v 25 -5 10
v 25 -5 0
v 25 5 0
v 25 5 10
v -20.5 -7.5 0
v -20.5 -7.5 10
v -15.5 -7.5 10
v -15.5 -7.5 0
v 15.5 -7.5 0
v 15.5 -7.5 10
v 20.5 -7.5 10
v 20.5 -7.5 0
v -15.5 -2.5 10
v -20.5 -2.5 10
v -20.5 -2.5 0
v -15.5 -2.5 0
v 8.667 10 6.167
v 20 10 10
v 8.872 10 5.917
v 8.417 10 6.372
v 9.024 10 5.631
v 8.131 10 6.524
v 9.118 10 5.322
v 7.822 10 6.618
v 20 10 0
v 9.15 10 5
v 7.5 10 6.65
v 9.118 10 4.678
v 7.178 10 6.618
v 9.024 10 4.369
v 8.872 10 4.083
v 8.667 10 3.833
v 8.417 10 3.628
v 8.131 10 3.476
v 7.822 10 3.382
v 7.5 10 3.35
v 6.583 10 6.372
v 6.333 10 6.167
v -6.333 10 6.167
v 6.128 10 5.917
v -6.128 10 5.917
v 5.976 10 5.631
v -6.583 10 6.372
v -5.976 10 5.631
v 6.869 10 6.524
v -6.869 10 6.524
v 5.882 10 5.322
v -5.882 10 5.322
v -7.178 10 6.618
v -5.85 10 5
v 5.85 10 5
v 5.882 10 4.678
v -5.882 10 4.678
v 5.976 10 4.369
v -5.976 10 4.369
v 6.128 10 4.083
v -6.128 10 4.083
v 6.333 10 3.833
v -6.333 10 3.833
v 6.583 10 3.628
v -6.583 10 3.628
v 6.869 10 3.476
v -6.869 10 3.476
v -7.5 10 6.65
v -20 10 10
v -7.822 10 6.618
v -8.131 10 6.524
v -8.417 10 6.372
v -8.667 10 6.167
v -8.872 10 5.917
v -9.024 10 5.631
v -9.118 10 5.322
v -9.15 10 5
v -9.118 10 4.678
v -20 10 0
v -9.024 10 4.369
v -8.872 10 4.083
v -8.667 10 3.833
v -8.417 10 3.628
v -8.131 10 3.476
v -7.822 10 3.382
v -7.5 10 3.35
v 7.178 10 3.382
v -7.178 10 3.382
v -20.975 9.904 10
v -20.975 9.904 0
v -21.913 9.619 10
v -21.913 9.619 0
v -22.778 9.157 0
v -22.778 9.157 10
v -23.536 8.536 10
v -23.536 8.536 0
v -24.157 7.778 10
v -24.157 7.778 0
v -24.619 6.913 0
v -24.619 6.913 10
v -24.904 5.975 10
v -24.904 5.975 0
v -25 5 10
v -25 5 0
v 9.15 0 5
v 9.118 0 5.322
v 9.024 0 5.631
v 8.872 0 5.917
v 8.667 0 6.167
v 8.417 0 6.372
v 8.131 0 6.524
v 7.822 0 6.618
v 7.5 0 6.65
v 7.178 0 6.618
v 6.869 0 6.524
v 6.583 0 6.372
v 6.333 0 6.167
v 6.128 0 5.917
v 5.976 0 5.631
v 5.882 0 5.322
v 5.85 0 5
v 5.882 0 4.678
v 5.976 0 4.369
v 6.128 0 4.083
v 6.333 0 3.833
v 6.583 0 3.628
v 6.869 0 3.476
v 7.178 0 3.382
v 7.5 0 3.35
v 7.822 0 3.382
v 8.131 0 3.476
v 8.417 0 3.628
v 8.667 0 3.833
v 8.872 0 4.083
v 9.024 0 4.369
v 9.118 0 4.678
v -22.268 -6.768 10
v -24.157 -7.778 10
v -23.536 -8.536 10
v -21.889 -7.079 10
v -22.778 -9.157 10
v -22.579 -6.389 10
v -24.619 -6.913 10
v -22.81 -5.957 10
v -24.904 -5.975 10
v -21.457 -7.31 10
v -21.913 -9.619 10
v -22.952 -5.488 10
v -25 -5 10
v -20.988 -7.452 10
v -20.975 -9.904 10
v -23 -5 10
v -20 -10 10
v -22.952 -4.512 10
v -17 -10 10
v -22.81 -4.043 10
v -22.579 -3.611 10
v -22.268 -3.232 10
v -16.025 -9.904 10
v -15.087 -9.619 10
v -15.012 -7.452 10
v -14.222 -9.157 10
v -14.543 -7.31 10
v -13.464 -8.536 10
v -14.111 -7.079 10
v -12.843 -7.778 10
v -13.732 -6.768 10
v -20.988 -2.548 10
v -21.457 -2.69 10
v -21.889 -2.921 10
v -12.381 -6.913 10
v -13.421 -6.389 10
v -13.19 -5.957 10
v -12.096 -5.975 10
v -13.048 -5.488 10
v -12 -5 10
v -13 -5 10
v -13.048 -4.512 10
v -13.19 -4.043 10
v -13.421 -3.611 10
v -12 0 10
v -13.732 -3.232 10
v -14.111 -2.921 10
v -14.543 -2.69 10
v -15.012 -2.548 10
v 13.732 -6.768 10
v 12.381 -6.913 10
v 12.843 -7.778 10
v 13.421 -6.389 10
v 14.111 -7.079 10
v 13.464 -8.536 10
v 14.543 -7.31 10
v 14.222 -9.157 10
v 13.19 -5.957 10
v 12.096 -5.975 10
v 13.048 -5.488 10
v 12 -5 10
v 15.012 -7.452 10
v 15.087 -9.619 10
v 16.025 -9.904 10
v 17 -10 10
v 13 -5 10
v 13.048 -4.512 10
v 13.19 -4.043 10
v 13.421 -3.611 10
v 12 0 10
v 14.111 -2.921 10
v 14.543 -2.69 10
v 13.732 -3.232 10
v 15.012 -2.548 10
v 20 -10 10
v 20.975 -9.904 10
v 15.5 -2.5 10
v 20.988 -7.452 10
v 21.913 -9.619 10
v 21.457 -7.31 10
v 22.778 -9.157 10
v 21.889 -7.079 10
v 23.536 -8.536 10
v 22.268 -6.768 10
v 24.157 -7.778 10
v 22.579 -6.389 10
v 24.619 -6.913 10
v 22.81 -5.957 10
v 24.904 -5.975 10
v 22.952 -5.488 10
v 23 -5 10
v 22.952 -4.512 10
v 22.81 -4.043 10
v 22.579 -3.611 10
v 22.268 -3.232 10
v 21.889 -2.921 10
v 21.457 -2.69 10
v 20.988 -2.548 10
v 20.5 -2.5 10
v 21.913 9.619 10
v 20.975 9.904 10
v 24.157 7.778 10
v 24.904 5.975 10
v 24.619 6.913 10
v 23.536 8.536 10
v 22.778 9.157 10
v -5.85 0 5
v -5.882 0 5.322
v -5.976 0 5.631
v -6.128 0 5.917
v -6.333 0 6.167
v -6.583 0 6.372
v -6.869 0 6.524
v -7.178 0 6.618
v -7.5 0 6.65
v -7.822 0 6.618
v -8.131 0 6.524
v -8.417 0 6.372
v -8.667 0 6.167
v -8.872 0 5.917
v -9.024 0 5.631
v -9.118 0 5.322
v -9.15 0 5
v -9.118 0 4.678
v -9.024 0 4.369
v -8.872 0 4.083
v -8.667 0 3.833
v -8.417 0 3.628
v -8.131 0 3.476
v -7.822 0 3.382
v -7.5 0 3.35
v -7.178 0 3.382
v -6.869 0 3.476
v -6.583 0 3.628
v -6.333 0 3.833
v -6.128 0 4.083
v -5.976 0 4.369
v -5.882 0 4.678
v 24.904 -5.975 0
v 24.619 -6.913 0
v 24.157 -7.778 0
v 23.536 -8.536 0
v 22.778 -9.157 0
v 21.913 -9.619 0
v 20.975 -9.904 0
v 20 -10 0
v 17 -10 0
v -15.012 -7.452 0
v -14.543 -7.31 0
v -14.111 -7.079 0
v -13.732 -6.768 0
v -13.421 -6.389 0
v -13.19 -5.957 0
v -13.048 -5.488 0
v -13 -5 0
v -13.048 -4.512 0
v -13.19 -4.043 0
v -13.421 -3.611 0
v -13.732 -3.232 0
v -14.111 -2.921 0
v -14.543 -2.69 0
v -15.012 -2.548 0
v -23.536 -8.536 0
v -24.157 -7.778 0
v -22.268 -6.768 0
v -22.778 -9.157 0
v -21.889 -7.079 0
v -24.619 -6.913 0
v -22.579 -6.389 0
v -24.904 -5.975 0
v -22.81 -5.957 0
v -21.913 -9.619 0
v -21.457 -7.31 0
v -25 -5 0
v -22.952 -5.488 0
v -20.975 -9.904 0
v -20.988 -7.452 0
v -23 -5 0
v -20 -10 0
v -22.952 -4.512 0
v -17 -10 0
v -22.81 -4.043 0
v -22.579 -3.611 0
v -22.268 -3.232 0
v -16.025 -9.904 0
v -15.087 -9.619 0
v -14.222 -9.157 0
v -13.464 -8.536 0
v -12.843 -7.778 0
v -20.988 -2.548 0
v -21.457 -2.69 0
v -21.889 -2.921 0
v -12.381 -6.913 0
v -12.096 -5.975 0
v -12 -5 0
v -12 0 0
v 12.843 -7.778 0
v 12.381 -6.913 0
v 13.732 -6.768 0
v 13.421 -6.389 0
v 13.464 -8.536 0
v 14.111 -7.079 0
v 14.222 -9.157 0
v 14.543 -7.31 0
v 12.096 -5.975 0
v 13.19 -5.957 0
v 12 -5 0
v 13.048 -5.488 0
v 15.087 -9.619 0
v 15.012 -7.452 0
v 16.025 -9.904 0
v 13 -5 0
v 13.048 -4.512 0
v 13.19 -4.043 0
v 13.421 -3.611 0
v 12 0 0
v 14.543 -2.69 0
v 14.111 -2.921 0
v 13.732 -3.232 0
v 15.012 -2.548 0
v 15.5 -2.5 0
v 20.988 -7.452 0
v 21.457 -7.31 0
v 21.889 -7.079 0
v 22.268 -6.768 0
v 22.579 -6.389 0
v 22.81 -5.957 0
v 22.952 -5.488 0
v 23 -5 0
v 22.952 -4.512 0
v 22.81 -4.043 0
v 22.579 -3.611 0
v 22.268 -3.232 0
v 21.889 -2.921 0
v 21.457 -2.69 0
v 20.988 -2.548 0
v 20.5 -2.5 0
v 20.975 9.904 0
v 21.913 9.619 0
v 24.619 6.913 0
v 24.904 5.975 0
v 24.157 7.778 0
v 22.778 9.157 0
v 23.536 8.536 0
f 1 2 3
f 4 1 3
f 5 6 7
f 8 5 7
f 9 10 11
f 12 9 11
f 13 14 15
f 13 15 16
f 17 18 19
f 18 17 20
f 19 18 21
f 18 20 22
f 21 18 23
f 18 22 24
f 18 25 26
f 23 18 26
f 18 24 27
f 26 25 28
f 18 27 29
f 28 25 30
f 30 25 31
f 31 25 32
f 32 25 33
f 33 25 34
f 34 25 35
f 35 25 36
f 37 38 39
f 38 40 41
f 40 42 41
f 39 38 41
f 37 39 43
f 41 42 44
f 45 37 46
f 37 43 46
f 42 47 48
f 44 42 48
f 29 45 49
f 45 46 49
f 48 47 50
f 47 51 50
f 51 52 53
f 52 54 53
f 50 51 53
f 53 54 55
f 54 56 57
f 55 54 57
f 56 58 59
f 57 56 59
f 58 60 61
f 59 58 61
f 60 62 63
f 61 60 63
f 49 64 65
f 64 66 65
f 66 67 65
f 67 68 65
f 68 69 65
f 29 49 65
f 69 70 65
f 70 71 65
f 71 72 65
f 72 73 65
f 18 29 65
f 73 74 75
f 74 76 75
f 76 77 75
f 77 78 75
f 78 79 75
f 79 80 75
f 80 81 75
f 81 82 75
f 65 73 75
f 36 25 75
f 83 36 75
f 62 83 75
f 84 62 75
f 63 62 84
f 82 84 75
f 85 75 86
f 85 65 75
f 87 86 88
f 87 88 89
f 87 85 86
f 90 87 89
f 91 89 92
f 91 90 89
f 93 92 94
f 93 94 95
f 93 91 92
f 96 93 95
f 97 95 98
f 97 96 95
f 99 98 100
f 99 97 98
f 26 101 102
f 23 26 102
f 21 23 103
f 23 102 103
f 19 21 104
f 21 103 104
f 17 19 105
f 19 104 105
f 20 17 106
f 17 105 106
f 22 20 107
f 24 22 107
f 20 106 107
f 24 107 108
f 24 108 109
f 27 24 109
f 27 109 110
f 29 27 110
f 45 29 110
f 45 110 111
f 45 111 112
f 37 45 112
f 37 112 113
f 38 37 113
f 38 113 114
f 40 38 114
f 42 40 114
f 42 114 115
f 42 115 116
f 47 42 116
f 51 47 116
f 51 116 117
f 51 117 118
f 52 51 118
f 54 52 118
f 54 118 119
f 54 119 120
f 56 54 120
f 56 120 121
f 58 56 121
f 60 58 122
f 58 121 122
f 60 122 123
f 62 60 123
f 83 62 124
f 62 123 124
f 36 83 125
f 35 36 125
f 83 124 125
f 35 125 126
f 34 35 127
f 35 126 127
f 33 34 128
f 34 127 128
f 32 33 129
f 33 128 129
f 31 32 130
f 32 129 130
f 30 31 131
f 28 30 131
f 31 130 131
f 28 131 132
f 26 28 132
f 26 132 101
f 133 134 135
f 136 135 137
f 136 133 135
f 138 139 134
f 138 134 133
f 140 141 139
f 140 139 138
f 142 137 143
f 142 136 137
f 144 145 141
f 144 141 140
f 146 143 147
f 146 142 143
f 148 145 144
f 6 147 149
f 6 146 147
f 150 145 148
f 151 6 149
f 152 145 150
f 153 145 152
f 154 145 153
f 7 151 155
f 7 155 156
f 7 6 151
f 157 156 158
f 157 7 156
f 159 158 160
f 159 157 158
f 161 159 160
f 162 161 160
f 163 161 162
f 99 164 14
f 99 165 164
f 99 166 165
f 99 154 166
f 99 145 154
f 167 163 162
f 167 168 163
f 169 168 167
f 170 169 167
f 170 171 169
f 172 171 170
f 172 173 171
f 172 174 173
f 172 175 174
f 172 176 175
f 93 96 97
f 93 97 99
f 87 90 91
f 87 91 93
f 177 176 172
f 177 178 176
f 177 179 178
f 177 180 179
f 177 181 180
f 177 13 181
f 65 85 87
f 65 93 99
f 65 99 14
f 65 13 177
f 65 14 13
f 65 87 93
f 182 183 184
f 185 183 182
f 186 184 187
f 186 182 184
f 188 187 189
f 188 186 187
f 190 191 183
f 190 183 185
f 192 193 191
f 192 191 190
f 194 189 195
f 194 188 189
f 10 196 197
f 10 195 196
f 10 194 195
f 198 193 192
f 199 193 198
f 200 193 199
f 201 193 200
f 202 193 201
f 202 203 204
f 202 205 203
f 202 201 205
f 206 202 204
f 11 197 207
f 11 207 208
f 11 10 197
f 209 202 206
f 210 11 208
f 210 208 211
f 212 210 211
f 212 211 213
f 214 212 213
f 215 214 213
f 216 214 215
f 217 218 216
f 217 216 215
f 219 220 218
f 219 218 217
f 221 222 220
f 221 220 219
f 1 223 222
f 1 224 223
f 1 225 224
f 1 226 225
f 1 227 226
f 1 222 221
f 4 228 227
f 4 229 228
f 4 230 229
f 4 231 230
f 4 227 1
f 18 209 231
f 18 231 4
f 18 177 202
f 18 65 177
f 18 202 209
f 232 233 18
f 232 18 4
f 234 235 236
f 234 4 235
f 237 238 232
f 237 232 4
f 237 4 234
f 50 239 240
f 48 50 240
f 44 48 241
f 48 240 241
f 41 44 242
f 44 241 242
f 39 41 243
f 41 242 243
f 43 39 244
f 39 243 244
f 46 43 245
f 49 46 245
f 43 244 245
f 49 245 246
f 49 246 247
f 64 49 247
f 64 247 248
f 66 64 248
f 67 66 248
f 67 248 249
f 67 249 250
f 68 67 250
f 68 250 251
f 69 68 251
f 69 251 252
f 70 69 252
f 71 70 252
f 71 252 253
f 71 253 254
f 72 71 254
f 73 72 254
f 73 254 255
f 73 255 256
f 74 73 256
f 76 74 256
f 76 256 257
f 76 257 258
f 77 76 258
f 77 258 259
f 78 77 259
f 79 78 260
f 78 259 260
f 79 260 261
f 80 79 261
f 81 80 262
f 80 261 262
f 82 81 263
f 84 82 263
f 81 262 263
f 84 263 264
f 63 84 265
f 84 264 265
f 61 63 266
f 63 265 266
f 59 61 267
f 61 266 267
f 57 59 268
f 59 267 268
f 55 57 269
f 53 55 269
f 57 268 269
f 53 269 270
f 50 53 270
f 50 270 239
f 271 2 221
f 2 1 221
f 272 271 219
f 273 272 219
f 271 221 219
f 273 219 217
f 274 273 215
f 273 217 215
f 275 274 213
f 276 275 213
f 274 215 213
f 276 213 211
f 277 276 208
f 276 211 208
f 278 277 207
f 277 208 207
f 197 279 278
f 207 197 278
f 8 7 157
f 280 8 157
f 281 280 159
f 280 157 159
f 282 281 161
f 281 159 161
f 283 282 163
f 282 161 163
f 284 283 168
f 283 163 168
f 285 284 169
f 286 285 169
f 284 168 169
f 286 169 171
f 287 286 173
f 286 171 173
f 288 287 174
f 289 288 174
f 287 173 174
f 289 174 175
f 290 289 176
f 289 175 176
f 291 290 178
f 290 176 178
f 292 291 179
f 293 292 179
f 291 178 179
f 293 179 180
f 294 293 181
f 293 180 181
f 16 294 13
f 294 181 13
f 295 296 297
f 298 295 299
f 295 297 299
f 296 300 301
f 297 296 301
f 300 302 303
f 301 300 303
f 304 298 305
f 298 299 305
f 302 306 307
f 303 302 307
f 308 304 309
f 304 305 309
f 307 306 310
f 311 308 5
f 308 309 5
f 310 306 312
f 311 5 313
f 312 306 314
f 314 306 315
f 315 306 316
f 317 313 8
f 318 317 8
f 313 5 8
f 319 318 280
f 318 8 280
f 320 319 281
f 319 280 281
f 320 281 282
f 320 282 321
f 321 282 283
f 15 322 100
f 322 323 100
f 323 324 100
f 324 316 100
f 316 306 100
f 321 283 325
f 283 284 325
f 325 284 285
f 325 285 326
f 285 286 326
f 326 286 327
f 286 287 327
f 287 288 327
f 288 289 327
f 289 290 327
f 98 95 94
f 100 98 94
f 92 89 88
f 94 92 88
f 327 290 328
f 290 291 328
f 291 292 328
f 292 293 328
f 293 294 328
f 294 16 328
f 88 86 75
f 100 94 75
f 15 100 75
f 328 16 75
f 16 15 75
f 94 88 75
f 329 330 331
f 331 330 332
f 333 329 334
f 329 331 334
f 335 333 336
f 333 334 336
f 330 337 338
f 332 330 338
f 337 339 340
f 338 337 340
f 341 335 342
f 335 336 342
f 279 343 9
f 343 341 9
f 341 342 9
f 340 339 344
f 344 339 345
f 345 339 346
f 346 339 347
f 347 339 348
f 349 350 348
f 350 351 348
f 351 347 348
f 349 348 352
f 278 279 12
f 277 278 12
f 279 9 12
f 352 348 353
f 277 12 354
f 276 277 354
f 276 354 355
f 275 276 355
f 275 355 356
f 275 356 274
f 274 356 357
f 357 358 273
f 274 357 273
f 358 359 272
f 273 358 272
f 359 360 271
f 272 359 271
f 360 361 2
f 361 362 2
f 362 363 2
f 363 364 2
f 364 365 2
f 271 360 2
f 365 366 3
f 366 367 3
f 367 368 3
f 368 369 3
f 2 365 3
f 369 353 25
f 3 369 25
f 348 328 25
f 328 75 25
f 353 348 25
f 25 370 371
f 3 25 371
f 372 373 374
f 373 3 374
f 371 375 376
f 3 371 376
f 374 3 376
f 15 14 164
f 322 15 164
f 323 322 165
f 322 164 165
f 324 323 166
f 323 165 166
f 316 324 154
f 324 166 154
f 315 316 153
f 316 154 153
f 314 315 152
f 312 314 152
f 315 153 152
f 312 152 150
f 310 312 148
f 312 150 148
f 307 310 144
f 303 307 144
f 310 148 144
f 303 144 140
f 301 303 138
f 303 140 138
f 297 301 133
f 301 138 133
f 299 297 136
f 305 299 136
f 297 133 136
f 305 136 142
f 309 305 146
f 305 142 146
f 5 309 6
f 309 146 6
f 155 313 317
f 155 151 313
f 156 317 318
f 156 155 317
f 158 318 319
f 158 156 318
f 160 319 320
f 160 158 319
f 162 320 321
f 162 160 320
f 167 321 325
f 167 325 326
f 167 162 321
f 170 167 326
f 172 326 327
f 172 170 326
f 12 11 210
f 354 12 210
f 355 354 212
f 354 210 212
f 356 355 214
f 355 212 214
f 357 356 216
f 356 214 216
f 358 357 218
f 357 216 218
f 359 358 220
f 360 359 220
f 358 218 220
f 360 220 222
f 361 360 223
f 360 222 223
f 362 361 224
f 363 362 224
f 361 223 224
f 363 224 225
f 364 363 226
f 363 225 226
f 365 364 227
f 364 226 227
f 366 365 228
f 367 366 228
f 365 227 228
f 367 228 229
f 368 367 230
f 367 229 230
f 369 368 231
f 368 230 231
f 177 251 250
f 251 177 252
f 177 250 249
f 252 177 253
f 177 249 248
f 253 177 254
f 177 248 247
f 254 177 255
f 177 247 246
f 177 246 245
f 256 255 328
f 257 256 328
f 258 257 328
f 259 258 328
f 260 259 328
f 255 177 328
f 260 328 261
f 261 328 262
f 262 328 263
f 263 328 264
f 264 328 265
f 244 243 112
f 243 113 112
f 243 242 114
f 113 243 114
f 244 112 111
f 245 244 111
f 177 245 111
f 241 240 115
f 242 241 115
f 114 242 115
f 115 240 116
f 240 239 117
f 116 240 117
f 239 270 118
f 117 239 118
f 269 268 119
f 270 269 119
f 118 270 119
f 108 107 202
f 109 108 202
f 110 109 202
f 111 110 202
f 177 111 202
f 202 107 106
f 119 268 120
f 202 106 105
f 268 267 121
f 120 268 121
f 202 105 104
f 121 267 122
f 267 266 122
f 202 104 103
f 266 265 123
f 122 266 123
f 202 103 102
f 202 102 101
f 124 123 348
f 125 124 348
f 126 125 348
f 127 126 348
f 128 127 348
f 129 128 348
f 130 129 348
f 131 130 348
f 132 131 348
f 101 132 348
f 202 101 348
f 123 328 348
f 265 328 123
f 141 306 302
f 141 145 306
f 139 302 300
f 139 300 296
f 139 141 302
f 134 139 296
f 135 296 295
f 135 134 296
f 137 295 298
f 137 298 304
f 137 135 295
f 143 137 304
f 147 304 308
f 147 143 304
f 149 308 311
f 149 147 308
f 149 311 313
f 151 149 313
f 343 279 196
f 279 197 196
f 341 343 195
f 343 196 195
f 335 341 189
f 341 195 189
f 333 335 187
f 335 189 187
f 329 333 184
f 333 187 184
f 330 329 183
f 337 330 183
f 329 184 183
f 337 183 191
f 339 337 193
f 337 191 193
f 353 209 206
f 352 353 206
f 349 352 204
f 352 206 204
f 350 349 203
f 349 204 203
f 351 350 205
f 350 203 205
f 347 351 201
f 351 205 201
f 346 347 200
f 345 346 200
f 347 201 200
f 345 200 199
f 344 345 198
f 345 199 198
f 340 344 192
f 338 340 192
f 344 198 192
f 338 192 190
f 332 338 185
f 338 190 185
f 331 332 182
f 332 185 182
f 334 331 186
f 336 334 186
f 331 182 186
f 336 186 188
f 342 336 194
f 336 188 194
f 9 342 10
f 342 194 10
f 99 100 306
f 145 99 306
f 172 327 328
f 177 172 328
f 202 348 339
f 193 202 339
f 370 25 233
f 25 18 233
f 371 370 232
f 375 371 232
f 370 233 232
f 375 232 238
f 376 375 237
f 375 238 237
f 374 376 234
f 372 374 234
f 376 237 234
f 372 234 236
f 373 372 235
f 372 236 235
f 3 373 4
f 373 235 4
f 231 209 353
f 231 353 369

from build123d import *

# Parameters (mm, degrees)
F1_DEPTH = 10
F2_W     = 5
F2_H     = 5
F3_DEPTH = 10
F4_R     = 1.65
F5_DEPTH = 10.001
F6_R     = 5


with BuildPart() as f1:
    # F0 (on Top) → F1 (new body)
    with BuildSketch(Plane.XY):
        Polygon((25, 10), (-25, 10), (-25, -10), (-12, -10), (-12, 0), (12, 0), (12, -10), (25, -10), align=None)
    extrude(amount=F1_DEPTH)

    # F2 (on face) → F3 (cut)
    with BuildSketch(Plane.XY.offset(10)):
        with Locations((-18, -5)):
            Rectangle(F2_W, F2_H)
        with BuildLine():
            Line((-20.5, -7.5), (-20.5, -2.5))
            ThreePointArc((-20.5, -2.5), (-23, -5), (-20.5, -7.5))
        make_face()
        with BuildLine():
            ThreePointArc((-15.5, -7.5), (-13, -5), (-15.5, -2.5))
            Line((-15.5, -2.5), (-15.5, -7.5))
        make_face()
        with Locations((18, -5)):
            Rectangle(F2_W, F2_H)
        with BuildLine():
            Line((15.5, -7.5), (15.5, -2.5))
            ThreePointArc((15.5, -2.5), (13, -5), (15.5, -7.5))
        make_face()
        with BuildLine():
            ThreePointArc((20.5, -7.5), (23, -5), (20.5, -2.5))
            Line((20.5, -2.5), (20.5, -7.5))
        make_face()
    extrude(amount=-F3_DEPTH, mode=Mode.SUBTRACT)

    # F4 (on face) → F5 (cut, through all)
    with BuildSketch(Plane.XZ):
        with Locations((-7.5, 5)):
            Circle(F4_R)
        with Locations((7.5, 5)):
            Circle(F4_R)
    extrude(amount=-F5_DEPTH, mode=Mode.SUBTRACT)

    # F6
    f6_edges = [f1.edges().sort_by_distance(p)[0] for p in [
        (-25, -10, 5),
        (-12, -10, 5),
        (12, -10, 5),
        (25, -10, 5),
        (25, 10, 5),
        (-25, 10, 5),
    ]]
    fillet(f6_edges, radius=F6_R)


solid = f1.part
